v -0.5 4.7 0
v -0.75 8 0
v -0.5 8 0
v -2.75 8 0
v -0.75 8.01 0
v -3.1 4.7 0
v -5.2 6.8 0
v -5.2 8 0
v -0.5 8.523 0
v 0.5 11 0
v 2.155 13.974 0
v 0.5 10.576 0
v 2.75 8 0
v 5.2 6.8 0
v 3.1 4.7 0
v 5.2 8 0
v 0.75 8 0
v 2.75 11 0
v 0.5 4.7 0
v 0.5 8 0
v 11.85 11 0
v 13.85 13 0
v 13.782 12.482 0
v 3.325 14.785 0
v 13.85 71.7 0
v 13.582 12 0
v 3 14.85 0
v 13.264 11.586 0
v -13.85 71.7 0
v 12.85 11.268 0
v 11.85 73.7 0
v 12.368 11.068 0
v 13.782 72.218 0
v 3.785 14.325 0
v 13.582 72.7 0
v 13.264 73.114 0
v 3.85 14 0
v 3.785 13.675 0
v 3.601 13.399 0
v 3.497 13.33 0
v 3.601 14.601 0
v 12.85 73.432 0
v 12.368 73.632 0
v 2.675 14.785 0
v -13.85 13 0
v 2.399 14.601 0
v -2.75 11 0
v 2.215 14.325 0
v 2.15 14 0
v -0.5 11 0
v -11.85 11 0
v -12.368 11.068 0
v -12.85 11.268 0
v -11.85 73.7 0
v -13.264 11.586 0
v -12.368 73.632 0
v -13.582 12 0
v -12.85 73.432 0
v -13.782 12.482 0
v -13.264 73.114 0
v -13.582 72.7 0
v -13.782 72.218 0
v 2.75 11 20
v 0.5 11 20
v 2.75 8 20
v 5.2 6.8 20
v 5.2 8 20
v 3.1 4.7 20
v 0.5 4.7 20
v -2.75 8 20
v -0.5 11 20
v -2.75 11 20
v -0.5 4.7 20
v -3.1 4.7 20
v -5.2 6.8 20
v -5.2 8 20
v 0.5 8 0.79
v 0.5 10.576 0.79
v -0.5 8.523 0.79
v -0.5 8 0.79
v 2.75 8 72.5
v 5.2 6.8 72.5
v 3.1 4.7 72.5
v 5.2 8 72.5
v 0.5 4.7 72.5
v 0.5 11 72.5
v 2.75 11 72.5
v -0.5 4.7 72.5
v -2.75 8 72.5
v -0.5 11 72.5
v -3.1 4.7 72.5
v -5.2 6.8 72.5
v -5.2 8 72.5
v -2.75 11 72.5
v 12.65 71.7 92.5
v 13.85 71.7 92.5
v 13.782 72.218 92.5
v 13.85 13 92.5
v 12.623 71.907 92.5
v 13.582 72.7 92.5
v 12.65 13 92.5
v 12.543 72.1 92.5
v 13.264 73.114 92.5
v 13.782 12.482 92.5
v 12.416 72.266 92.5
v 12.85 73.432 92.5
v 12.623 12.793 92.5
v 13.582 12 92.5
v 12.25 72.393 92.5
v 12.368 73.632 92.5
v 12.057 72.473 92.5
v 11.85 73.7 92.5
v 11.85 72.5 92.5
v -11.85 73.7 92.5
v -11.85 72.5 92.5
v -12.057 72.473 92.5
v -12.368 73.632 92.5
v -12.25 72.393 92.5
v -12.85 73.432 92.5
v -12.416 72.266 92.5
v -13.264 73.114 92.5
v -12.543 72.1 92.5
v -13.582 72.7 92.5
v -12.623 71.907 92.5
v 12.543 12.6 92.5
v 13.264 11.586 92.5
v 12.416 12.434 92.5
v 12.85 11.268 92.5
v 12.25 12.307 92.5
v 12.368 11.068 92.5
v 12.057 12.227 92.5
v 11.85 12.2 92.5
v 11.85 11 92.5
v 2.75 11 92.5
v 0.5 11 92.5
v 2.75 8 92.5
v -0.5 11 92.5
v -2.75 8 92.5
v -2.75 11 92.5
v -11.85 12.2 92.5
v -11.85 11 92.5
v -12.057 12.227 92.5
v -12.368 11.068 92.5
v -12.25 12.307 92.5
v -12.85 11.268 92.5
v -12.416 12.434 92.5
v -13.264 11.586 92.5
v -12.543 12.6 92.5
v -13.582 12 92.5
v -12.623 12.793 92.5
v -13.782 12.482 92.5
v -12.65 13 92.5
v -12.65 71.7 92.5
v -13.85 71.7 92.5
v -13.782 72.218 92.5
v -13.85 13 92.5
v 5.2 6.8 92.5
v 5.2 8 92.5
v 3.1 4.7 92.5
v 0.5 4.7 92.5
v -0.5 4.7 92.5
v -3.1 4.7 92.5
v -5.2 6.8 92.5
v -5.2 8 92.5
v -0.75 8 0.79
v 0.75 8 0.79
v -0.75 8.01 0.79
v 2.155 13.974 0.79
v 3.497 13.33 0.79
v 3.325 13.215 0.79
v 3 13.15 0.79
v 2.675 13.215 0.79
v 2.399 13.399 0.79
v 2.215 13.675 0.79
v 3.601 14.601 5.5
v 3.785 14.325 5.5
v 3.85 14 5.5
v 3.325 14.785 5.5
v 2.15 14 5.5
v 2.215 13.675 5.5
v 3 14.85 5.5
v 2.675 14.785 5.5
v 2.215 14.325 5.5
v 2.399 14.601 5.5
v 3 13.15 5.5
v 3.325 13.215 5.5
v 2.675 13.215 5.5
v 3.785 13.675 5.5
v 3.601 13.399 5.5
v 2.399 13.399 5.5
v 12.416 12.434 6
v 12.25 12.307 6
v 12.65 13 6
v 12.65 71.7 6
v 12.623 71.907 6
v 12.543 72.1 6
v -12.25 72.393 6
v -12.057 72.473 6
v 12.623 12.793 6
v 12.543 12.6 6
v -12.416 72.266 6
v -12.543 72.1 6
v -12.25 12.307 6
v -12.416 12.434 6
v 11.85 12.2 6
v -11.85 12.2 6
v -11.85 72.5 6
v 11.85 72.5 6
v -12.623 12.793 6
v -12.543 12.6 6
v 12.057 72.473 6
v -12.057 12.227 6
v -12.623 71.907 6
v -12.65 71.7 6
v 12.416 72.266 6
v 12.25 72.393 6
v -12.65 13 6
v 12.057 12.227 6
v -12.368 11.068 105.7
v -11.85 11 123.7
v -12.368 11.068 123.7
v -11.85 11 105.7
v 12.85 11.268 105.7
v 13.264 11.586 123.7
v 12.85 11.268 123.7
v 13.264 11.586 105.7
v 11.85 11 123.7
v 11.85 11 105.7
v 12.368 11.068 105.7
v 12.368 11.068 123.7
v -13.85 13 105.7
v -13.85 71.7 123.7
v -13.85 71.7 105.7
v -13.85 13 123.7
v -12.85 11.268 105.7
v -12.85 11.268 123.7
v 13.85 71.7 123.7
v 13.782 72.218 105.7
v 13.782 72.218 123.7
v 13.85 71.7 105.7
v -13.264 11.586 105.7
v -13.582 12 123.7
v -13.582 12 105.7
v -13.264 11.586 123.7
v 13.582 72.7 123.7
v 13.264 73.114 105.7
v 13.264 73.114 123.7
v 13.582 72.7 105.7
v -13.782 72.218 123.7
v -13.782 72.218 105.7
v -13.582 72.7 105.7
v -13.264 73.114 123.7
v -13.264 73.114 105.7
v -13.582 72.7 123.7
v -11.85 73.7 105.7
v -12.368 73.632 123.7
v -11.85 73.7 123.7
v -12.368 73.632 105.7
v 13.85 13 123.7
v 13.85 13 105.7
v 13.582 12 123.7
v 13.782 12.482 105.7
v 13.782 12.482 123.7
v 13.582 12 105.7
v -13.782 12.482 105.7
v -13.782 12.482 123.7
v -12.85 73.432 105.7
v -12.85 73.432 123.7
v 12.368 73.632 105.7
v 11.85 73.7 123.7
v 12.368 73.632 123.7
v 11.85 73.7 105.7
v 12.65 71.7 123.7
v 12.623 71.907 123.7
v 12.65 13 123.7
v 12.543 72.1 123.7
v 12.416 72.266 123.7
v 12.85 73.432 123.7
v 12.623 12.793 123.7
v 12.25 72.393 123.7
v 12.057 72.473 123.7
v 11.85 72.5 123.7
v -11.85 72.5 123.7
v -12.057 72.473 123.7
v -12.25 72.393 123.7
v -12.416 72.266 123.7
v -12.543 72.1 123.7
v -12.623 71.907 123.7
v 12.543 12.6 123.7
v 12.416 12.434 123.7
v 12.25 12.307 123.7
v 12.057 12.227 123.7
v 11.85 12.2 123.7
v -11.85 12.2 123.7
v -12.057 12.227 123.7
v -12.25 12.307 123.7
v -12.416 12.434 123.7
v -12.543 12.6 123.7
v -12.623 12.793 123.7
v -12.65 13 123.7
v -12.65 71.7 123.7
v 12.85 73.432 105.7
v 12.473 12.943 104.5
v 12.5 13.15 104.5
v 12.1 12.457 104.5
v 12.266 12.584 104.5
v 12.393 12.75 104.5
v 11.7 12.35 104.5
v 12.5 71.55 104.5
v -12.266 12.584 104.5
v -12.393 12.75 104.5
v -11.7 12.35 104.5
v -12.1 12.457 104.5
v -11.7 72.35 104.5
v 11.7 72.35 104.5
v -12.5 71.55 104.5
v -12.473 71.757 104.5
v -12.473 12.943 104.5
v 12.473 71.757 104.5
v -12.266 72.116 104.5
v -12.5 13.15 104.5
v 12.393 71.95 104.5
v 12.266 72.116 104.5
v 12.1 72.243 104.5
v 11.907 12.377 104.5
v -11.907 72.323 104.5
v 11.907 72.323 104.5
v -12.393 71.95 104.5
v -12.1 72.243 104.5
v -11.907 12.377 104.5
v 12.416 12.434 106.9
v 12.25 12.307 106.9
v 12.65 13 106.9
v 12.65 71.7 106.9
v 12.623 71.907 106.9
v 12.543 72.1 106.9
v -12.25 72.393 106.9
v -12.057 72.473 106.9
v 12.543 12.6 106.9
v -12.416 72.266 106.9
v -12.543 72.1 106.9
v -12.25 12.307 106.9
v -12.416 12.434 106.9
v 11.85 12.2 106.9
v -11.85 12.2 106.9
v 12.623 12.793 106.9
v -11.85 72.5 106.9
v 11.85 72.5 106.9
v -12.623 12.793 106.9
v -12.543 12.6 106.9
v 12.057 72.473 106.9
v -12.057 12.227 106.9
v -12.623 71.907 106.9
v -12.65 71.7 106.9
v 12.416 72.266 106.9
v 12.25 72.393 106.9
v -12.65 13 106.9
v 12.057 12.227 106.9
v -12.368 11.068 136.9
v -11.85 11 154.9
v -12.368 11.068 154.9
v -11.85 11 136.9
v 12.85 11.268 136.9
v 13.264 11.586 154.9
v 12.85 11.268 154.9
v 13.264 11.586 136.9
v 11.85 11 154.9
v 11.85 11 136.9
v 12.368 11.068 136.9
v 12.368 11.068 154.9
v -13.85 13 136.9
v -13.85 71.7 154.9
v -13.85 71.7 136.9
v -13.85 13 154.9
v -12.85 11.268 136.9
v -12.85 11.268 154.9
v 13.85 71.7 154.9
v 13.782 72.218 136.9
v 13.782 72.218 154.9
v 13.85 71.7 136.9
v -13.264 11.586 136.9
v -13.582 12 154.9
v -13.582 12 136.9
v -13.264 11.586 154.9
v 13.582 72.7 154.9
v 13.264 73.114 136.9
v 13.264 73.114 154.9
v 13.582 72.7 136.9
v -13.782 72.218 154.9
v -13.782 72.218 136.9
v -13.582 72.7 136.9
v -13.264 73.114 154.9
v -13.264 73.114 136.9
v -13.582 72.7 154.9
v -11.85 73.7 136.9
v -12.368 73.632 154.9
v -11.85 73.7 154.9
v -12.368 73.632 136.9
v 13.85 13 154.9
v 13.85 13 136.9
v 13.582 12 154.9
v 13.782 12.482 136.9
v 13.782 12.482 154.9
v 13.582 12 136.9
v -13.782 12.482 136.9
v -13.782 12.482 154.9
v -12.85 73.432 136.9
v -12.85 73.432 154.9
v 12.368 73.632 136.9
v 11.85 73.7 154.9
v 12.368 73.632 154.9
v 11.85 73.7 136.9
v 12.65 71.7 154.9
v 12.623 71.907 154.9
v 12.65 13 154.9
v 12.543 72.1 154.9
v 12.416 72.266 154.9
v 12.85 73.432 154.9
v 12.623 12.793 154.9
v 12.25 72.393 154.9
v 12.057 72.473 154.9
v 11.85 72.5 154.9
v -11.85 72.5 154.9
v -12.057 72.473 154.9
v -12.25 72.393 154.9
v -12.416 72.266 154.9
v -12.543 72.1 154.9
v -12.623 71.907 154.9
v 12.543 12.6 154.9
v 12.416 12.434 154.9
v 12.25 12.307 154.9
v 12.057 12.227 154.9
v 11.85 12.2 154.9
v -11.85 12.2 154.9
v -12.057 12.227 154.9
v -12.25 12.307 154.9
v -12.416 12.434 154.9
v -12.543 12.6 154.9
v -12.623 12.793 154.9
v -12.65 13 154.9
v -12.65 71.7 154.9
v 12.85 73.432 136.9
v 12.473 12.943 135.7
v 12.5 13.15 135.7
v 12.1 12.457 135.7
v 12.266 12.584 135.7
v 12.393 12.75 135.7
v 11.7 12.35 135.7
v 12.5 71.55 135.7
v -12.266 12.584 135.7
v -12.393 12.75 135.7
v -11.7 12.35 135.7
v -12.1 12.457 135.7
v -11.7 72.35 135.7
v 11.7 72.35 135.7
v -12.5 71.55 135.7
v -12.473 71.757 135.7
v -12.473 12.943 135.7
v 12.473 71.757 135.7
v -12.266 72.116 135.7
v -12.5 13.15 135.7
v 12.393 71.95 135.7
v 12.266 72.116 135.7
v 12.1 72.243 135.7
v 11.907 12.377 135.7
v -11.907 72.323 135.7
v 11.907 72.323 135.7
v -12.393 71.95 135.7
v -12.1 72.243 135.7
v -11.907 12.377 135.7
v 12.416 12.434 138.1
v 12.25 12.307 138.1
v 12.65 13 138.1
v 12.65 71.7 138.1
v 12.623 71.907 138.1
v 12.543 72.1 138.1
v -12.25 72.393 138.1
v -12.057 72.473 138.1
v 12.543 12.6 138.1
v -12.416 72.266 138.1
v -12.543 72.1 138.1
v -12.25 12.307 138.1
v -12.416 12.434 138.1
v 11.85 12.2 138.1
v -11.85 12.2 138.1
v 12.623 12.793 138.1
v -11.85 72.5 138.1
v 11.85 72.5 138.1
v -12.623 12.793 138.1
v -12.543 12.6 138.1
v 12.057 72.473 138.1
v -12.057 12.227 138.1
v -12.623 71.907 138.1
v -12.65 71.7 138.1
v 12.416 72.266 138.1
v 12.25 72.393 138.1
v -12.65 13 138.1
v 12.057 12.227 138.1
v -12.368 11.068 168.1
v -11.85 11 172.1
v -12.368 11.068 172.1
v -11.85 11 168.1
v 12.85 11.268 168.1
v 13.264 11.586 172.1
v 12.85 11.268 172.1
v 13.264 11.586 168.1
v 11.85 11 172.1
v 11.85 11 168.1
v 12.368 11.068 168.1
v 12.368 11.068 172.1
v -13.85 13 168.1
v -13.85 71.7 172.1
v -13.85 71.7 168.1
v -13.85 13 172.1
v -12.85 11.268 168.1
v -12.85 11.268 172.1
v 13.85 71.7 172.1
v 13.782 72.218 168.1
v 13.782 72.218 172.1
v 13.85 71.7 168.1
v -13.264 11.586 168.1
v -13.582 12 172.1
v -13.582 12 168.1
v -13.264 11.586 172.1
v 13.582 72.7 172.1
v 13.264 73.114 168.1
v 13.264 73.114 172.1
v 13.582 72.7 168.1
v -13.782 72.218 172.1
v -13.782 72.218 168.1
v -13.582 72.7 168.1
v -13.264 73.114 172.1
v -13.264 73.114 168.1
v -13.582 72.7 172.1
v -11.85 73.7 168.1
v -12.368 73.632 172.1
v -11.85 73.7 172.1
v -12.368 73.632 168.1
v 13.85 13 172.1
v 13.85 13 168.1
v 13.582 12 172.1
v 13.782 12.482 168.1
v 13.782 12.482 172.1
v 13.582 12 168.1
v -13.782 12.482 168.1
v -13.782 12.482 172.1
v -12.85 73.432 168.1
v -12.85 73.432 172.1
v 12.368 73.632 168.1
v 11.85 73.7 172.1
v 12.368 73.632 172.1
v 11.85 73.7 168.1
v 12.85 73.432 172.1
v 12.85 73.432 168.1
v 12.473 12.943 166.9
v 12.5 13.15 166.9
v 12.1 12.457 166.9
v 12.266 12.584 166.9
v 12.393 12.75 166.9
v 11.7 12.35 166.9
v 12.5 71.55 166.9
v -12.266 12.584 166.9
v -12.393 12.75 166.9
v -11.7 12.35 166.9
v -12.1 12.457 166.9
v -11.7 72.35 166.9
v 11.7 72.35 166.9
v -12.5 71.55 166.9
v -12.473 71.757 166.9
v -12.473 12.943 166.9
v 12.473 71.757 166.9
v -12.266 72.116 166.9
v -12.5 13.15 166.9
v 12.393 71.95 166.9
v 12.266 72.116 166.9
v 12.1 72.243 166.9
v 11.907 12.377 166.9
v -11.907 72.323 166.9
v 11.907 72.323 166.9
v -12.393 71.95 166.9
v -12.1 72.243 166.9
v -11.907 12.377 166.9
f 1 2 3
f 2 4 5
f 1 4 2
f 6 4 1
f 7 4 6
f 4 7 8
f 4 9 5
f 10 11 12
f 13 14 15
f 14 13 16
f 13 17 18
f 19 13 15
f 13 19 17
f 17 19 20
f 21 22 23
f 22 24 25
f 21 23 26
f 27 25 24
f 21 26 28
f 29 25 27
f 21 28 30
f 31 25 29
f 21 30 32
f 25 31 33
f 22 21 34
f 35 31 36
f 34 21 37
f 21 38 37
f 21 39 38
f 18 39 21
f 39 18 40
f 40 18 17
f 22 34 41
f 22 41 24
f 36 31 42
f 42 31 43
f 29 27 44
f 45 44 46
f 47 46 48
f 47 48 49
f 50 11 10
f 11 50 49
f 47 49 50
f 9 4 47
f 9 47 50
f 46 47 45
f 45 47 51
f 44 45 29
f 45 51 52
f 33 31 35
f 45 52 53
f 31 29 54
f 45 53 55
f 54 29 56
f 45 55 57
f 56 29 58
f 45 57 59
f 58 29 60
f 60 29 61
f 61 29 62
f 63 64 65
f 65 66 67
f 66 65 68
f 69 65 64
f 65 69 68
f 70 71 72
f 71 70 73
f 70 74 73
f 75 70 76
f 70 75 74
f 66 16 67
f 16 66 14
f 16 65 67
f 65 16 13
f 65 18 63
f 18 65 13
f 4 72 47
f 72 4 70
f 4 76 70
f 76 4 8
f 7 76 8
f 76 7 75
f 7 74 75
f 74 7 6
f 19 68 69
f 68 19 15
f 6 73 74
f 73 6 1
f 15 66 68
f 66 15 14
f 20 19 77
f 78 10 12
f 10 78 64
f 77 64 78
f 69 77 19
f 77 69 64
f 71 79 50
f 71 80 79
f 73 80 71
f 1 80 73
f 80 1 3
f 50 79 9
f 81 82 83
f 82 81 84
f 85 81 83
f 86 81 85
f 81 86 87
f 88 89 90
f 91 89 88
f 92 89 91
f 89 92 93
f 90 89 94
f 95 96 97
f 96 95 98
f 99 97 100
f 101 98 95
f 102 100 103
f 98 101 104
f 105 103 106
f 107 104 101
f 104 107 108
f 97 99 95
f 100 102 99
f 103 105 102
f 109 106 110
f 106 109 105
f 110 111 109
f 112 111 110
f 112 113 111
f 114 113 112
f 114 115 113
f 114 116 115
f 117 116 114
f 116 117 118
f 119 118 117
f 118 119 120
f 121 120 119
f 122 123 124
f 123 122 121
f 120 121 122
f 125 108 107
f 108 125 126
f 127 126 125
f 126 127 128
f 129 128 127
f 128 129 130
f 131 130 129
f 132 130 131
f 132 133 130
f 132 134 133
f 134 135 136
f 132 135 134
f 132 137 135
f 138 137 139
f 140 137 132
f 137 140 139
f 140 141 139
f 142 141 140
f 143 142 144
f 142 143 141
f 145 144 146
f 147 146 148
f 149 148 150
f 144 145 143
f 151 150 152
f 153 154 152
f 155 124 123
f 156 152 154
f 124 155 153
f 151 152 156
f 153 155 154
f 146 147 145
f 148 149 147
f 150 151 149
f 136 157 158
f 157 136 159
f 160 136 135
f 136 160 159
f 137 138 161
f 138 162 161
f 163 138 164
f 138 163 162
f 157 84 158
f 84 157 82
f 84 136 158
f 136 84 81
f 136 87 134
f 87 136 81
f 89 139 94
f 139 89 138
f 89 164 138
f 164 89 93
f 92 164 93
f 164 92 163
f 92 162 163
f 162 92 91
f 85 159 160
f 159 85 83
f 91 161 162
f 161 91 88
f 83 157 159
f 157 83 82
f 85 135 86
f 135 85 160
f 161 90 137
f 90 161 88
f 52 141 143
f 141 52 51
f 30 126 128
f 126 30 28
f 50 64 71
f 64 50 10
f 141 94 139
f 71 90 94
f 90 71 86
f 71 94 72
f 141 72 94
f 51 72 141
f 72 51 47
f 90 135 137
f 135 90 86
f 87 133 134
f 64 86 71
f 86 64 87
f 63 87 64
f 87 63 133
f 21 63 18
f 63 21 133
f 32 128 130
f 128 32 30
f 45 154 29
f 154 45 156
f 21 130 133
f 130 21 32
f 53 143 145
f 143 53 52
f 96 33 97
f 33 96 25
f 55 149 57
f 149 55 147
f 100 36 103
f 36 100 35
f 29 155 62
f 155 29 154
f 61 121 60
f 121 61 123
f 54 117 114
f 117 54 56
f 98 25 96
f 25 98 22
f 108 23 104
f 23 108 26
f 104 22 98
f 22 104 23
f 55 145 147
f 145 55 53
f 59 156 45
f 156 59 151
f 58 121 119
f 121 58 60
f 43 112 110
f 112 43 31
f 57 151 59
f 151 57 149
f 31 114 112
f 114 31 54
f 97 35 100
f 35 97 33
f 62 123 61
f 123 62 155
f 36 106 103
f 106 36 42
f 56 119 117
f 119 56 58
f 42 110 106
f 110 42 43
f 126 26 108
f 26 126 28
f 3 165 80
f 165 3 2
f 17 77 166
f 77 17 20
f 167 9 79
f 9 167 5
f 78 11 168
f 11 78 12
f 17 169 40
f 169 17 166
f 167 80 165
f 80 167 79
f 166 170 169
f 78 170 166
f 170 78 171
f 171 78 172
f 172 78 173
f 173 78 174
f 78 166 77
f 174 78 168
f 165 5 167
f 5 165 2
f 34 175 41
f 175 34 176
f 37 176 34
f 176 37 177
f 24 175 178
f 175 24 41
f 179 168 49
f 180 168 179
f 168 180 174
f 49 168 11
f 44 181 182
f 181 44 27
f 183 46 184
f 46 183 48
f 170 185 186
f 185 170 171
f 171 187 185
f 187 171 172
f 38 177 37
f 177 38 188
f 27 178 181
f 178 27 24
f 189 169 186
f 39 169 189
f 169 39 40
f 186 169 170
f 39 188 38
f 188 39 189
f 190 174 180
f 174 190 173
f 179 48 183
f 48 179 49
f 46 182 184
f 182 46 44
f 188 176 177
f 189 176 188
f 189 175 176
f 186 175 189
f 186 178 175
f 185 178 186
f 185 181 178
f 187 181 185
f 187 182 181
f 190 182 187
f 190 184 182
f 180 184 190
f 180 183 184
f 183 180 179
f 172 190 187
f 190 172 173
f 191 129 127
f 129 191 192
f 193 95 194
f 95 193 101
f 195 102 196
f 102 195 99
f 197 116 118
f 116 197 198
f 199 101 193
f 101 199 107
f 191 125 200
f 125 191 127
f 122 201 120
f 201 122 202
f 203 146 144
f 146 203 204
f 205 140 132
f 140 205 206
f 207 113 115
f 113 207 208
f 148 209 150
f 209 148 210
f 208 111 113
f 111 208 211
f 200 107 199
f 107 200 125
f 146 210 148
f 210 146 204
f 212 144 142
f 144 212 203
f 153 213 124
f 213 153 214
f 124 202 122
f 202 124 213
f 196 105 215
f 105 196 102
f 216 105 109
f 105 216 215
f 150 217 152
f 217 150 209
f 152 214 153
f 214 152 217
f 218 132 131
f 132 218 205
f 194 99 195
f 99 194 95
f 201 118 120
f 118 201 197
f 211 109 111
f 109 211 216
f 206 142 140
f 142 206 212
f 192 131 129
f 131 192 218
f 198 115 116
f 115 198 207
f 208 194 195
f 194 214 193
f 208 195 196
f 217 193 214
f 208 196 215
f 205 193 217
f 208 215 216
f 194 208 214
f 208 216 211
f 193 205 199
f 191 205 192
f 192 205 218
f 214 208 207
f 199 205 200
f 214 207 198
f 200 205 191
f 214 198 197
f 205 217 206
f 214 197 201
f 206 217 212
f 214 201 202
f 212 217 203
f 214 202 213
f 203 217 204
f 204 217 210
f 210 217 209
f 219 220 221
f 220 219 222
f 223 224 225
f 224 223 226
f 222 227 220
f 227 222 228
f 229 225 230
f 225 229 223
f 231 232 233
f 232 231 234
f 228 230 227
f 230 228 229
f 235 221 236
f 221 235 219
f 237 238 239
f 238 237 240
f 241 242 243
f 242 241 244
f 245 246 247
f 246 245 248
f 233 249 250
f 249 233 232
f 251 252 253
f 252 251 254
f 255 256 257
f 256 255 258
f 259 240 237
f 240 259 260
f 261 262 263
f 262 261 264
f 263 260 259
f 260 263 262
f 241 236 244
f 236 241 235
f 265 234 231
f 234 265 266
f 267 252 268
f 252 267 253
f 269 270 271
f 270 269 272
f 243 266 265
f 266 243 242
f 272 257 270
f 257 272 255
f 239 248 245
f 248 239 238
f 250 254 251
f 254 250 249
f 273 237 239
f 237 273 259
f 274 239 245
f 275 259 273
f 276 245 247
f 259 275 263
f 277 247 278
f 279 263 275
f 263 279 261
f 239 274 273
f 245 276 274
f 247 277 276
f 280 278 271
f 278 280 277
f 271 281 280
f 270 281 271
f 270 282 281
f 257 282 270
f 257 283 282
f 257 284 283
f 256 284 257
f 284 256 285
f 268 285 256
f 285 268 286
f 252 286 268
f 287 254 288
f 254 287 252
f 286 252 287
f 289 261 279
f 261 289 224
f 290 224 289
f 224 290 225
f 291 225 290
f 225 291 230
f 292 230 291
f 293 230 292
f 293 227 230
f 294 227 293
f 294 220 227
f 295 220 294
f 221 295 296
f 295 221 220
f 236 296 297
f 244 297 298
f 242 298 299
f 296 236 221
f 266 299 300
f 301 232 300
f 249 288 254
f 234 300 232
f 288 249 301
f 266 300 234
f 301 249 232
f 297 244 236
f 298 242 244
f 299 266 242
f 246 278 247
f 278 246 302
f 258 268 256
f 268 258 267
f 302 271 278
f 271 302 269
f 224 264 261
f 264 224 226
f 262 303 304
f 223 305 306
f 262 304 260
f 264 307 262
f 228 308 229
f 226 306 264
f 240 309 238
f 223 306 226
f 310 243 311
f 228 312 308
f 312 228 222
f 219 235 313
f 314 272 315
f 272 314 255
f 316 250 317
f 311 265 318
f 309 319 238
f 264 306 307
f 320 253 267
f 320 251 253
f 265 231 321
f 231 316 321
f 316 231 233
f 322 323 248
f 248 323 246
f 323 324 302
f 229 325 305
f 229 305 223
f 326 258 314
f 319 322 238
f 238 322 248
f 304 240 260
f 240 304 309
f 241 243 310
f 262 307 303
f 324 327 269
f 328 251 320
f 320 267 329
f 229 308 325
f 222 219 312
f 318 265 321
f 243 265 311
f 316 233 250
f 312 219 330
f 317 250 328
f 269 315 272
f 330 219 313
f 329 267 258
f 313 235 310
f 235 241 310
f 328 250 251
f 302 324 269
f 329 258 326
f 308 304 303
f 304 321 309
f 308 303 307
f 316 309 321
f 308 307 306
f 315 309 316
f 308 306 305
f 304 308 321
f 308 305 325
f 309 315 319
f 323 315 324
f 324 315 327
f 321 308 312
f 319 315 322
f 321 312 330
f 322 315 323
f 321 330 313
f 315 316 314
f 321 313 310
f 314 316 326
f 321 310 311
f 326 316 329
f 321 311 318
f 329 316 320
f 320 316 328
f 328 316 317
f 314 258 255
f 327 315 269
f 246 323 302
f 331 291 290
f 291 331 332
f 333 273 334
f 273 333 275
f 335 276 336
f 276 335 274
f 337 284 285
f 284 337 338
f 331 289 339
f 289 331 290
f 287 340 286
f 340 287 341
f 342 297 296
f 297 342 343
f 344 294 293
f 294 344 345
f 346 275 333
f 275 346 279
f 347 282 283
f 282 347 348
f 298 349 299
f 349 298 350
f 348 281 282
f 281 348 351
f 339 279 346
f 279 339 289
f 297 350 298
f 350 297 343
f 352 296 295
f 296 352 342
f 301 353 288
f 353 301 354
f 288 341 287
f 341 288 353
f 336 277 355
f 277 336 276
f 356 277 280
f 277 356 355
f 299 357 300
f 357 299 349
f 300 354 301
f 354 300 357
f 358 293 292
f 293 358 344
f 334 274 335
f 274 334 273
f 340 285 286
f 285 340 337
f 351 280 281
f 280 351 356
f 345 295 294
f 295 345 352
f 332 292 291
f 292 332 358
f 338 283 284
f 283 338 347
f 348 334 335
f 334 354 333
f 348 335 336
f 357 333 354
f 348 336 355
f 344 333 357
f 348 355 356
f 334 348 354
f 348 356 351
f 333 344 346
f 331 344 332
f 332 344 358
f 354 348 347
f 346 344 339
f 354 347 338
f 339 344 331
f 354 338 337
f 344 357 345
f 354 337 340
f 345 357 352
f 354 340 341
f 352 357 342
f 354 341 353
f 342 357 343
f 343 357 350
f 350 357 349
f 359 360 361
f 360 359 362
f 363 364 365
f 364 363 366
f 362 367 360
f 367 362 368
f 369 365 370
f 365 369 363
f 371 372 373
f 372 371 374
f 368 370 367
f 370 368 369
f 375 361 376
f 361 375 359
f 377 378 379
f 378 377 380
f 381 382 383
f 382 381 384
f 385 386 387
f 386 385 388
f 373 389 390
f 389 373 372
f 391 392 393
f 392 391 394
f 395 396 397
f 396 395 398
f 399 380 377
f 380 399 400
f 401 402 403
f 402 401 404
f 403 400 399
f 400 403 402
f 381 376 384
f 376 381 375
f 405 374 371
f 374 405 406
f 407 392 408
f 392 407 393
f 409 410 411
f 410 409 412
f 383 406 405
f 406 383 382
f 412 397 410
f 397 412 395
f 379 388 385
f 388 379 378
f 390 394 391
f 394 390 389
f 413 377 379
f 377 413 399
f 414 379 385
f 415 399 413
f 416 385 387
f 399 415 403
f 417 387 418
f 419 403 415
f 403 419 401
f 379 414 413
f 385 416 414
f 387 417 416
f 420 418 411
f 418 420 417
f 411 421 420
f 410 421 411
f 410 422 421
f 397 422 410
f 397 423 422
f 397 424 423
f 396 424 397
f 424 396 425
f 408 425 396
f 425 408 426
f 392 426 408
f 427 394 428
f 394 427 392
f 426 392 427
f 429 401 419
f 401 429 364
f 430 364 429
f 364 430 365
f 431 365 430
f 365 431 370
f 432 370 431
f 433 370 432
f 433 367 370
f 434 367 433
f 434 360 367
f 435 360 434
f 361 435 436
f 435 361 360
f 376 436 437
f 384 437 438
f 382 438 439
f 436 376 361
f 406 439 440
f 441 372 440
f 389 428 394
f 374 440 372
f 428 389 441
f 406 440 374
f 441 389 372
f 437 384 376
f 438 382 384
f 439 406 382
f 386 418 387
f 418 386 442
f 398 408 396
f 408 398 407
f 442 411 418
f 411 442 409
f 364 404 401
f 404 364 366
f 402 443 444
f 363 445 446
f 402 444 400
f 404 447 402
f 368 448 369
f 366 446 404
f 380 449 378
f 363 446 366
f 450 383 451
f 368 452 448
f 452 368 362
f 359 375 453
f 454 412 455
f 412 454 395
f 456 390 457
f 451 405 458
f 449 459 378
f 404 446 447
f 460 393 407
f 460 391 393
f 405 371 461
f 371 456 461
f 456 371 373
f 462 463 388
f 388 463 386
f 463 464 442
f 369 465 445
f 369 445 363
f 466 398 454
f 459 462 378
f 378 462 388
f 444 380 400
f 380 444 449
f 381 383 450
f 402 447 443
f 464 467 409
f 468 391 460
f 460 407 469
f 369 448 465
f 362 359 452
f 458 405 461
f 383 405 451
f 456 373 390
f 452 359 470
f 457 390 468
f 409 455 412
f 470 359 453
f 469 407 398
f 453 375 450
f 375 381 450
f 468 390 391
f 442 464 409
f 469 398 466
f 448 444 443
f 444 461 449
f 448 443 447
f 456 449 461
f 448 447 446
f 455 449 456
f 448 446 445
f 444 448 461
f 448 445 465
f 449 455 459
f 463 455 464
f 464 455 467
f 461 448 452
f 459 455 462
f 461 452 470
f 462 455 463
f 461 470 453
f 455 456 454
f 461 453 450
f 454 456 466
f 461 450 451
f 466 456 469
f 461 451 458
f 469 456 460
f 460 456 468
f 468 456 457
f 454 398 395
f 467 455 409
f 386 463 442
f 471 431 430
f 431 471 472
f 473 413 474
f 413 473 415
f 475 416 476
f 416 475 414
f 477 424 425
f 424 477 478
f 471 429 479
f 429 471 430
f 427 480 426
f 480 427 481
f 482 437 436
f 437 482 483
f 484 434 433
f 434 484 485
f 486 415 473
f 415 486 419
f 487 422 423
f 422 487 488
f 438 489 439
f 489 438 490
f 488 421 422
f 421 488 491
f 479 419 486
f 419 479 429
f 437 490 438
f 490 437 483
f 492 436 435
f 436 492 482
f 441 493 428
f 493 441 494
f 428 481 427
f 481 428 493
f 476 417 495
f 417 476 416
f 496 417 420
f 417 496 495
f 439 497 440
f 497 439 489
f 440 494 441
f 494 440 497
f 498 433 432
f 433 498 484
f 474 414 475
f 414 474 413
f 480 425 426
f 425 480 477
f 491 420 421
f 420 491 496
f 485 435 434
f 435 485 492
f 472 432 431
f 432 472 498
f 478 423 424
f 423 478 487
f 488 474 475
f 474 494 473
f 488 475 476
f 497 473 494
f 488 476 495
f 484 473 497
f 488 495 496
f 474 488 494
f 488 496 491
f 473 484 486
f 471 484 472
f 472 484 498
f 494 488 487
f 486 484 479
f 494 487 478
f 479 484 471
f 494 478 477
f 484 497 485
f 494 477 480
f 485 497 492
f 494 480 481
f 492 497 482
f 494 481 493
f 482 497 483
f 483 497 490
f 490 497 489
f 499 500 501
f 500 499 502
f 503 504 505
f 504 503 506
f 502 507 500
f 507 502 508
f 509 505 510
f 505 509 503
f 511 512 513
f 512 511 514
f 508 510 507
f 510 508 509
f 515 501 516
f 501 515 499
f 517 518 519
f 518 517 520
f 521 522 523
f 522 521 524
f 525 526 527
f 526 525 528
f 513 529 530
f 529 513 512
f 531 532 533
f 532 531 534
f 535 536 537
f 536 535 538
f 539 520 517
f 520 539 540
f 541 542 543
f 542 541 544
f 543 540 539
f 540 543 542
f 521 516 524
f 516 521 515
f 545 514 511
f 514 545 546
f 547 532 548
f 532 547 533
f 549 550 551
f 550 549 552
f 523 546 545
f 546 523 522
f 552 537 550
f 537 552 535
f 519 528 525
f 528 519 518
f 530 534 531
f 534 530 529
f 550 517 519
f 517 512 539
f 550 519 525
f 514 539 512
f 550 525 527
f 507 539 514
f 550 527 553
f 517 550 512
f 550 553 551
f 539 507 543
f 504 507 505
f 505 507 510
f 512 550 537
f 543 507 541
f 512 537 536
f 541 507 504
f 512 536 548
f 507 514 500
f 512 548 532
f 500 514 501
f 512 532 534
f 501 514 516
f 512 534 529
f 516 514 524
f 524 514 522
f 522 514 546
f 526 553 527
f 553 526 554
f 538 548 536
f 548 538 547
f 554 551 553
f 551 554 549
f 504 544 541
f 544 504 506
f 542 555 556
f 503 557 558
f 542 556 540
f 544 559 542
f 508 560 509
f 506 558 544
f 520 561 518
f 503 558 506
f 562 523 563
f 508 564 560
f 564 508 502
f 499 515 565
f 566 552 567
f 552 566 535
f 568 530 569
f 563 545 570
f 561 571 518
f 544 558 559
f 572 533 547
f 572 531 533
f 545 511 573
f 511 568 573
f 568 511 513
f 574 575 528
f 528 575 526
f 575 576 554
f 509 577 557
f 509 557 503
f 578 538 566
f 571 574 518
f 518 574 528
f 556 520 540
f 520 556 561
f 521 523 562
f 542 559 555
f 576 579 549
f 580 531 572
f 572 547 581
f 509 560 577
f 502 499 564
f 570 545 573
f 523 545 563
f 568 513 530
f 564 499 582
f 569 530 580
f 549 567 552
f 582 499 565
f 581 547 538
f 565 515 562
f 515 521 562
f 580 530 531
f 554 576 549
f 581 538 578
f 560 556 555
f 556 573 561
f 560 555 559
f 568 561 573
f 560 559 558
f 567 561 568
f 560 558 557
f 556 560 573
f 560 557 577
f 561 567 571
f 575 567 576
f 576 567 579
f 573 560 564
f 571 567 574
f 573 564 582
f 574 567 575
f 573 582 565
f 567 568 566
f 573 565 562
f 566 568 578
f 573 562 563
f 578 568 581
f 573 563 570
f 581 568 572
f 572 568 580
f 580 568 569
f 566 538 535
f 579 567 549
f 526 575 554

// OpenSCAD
// Load stack, v7: a master load on the end of the balance line, add-on cells
// on top of it, a lid on top of those, hanging directly behind the spine and
// riding its rear T-slot on two flanged sliders. No guide lines: Matt tried
// them on the rig, 2026-09-19, and no tension competes with the mass.
//
// The master is a thin sleeve round Matt's lead-in-resin block, 25 x 60 x 85
// (insert), or two side by side (insert_n = 2); use_insert = false gives a
// shot box. Every piece is an OPEN box closed by the piece above, which has
// a chamfered foot that drops into the cavity below.
//
// The rail guides the master. Its body stands 1 mm off the rail's rear face,
// and a T slider is attached straight to the front wall at the top and at the
// bottom, 20 mm tall each: a stem through the slot's 6 mm opening and a head
// in the channel behind the lips, slit down the middle so the load line runs
// straight through. Both slide in from the rail's top end, before the spine
// cap goes on. The top one overhangs the wall by 5.3 mm; slice with support
// under it. The line runs down inside the channel,
// through both slits, out under the master, along a channel in the floor's
// underside to an M2 and is clamped under its head. The master's floor is
// thick enough to hold the screw, which is the only height this costs.
//
// Default view is the pieces in a column with gaps, bottom to top: master,
// cells, lid.
part = "column";   // [column, master, cell, lid, print, stack, test, slide]
// test: one T slider on a short slab, with the line hole and the M2 clamp.
test_d     = 12;
test_w     = 20;
// slide: a T slider slide_h tall on a handle, nothing else, for the sliding
// fit up and down the channel. Prints standing, so the section is true.
slide_h    = 20;
slide_handle = 6;    // behind the front face

rail       = 20;
// Plain T-slot 2020: spine-cap.scad has the same numbers. Measure the rail.
slot_w     = 6.0;    // opening at the face
lip_t      = 1.8;    // face to the underside of the lip
chan_w     = 11;     // channel width just behind the lips
chan_str   = 1.6;    // how far below the lips the channel stays full width, before it angles in at 45
chan_d     = 5.5;    // face to the floor
spine_clr  = 1.0;    // front face to the rail's rear face

use_insert = true;
insert     = [25, 60, 85];   // the block: across, deep, tall
insert_n   = 1;              // blocks side by side across
insert_clr = 0.3;            // total, on each of the three
shot_w     = 40;             // the shot-filled master's section instead
shot_d     = 60;
shot_h     = 80;

slider_h   = 20;     // each slider, top and bottom of the master; no wedge under the top one
cell_h     = 18;
cells      = 2;      // in the column and stack views
lid_t      = 4;
wall       = 1.2;    // three 0.4 mm perimeters
floor_t    = 1.2;    // cells
master_floor = 6;    // the master: holds the M2
foot_h     = 1.2;    // into the cavity below; its 45 degree flare is the wall
foot_clr   = 0.15;   // a side
corner     = 2;

// The T slider.
stem_w     = slot_w - 0.5;   // through the opening, 0.25 a side
head_w     = chan_w - 0.6;   // in the channel, 0.3 a side
head_clr   = 0.2;            // under the lips, and off the floor
slider_slit = 1.0;           // down the middle of each slider, for the line
tie_y      = 14;     // the M2, from the rail centre, up into the master's floor
tie_x      = 3;      // off centre, clear of the slit
m2_hole    = 1.7;    // M2 forms its own thread in PLA
m2_depth   = 5.5;    // a 5 mm screw
channel_w  = 1.5;    // the line across the trap's face, hole to screw
channel_d  = 0.8;
gap        = 12;     // between pieces in the column
$fn = 48;

shot_steel = 4.6; shot_lead = 6.8;
front_y  = rail/2 + spine_clr;
stem_in  = rail/2 - lip_t - head_clr;         // stem reaches to just under the lips
knee_in  = rail/2 - lip_t - chan_str + head_clr;   // where the channel starts angling in
head_in  = rail/2 - chan_d + head_clr;        // head reaches to just off the floor
head_bot = head_w - 2*(knee_in - head_in);    // width at the bottom after the 45 degree taper
line_y   = stem_in;                           // hole centred on the junction
stack_w  = use_insert ? insert_n*insert[0] + insert_clr + 2*wall : shot_w;
box_d    = use_insert ? insert[1] + insert_clr + 2*wall : shot_d;
stack_d  = box_d;
master_h = use_insert ? master_floor + insert[2] + insert_clr + foot_h : shot_h;
box_y    = front_y + box_d/2;
cav_w    = stack_w - 2*wall;
cav_d    = box_d - 2*wall;
master_cav = cav_w*cav_d*(master_h - master_floor - foot_h)/1000;
cell_cav   = cav_w*cav_d*(cell_h - floor_t - foot_h)/1000;
stack_h    = master_h + cells*cell_h + lid_t;
echo(str("master ", stack_w, " x ", stack_d, " x ", master_h, use_insert ? str(", round ", insert_n, " block(s)") :
         str(", ", master_cav, " cm3: ", master_cav*shot_steel, " g steel shot, ", master_cav*shot_lead, " g lead shot")));
echo(str("cell ", cell_cav, " cm3: ", cell_cav*shot_steel, " g steel shot"));
echo(str("stack ", stack_h, " mm tall with ", cells, " cells; budget about 130"));
echo(str("slider: stem ", stem_w, " wide to ", stem_in, " from centre; head ", head_w, " wide to ", knee_in,
         ", then 45 in to ", head_bot, " wide at ", head_in, "; line at ", line_y, ", ", rail/2 - line_y, " inside the face"));
assert(head_bot >= 3, "slider head tapers to nothing: raise head_in or chan_str");
assert(tie_y - m2_hole/2 >= front_y, "M2 in front of the master");
assert(master_floor >= m2_depth + 0.5, "master floor too thin for the M2");
assert(foot_h <= wall, "foot flare steeper than 45 degrees");
assert(cell_h >= floor_t + foot_h + 4, "cell too thin to hold anything");

module rbox(w, d, h, r) { linear_extrude(h) offset(r=r, $fn=24) square([w - 2*r, d - 2*r], center=true); }
module cavity(h, f=floor_t) { translate([0, box_y, f]) rbox(cav_w, cav_d, h, max(corner - wall, 0.5)); }
module foot() {
    translate([0, box_y, 0]) hull() {
        translate([0,0,-foot_h]) rbox(cav_w - 2*foot_clr, cav_d - 2*foot_clr, 0.01, max(corner - wall, 0.5));
        rbox(stack_w, box_d, 0.01, corner);
    }
}
// The T slider, height h: stem from the front face in to under the lips, a
// head full width for the channel's straight part, then 45 degrees in to the
// bottom, which is the shape of a 2020 channel.
module slider(h) {
    difference() {
        linear_extrude(h) polygon([
            [-stem_w/2, front_y + 0.01], [-stem_w/2, stem_in], [-head_w/2, stem_in], [-head_w/2, knee_in],
            [-head_bot/2, head_in], [head_bot/2, head_in], [head_w/2, knee_in], [head_w/2, stem_in],
            [stem_w/2, stem_in], [stem_w/2, front_y + 0.01]
        ]);
        translate([-slider_slit/2, head_in - 1, -1]) cube([slider_slit, front_y - head_in + 2, h + 2]);
    }
}
// Line termination on the underside: the line comes out of the bottom
// slider's slit at line_y, turns along a channel to the M2 and is clamped
// under its head. Drawn for z = 0 as the face, going +z into the material.
module termination() {
    hull() {
        translate([-channel_w/2, line_y, -0.01]) cube([channel_w, 0.01, channel_d]);
        translate([tie_x, tie_y, -0.01]) cylinder(h=channel_d, d=channel_w, $fn=12);
    }
    translate([tie_x, tie_y, -0.01]) cylinder(h=m2_depth + 0.01, d=m2_hole, $fn=16);
}
module master() {
    difference() {
        union() {
            translate([0, box_y, 0]) rbox(stack_w, box_d, master_h, corner);
            slider(slider_h);
            translate([0,0,master_h - slider_h]) slider(slider_h);
        }
        cavity(master_h, master_floor);
        termination();

    }
}
module cell() {
    difference() {
        union() { translate([0, box_y, 0]) rbox(stack_w, box_d, cell_h, corner); foot(); }
        cavity(cell_h);
    }
}
module lid() { union() { translate([0, box_y, 0]) rbox(stack_w, box_d, lid_t, corner); foot(); } }
module slide_test() {
    difference() {
        union() {
            translate([0, front_y + slide_handle/2, 0]) rbox(test_w, slide_handle, slide_h, corner);
            slider(slide_h);
        }
    }
}
module slider_test() {   // the bottom slider on a slab as thick as the master's floor
    difference() {
        union() {
            translate([0, front_y + test_d/2, 0]) rbox(test_w, test_d, master_floor, corner);
            slider(slider_h);
        }
        termination();
    }
}

module spine_stub(h) {
    %color([0.66,0.71,0.75]) translate([0,0,-40]) linear_extrude(h + 80) difference() {
        square(rail, center=true);
        for(a=[0:90:270]) rotate(a) {
            translate([-slot_w/2, rail/2 - lip_t]) square([slot_w, lip_t + 1]);
            translate([-chan_w/2, rail/2 - chan_d]) square([chan_w, chan_d - lip_t]);
        }
    }
    %color([0.1,0.7,0.9]) translate([0, line_y, -5]) cylinder(h=h + 60, d=0.6, $fn=8);
}

if(part == "master") master();
else if(part == "cell") translate([0,0,foot_h]) cell();
else if(part == "lid") translate([0,0,foot_h]) lid();
else if(part == "slide") {
    echo(str("slide: stem ", stem_w, " in a ", slot_w, " opening; head ", head_w, " in an ", chan_w, " channel for ",
             stem_in - knee_in, " under the lips, then 45 in to ", head_bot, " at ", stem_in - head_in, " deep; ",
             head_clr, " off the lips and the floor"));
    slide_test();
}
else if(part == "test") {
    echo(str("test: stem ", stem_w, " in a ", slot_w, " opening, head ", head_w, " in a ", chan_w, " channel, ",
             stem_in - head_in, " thick under ", lip_t, " lips; M2 hole ", m2_hole));
    slider_test();
}
else if(part == "column") {
    master();
    for(i=[0:cells-1]) translate([0,0,master_h + gap + foot_h + i*(cell_h + gap + foot_h)]) cell();
    translate([0,0,master_h + gap + foot_h + cells*(cell_h + gap + foot_h)]) lid();
}
else if(part == "print") {
    translate([-(stack_w + gap), 0, 0]) master();
    translate([0,0,foot_h]) cell();
    translate([stack_w + gap, 0, foot_h]) lid();
}
else if(part == "stack") {
    master();
    for(i=[0:cells-1]) translate([0,0,master_h + i*cell_h]) cell();
    translate([0,0,master_h + cells*cell_h]) lid();
    spine_stub(stack_h);
}
